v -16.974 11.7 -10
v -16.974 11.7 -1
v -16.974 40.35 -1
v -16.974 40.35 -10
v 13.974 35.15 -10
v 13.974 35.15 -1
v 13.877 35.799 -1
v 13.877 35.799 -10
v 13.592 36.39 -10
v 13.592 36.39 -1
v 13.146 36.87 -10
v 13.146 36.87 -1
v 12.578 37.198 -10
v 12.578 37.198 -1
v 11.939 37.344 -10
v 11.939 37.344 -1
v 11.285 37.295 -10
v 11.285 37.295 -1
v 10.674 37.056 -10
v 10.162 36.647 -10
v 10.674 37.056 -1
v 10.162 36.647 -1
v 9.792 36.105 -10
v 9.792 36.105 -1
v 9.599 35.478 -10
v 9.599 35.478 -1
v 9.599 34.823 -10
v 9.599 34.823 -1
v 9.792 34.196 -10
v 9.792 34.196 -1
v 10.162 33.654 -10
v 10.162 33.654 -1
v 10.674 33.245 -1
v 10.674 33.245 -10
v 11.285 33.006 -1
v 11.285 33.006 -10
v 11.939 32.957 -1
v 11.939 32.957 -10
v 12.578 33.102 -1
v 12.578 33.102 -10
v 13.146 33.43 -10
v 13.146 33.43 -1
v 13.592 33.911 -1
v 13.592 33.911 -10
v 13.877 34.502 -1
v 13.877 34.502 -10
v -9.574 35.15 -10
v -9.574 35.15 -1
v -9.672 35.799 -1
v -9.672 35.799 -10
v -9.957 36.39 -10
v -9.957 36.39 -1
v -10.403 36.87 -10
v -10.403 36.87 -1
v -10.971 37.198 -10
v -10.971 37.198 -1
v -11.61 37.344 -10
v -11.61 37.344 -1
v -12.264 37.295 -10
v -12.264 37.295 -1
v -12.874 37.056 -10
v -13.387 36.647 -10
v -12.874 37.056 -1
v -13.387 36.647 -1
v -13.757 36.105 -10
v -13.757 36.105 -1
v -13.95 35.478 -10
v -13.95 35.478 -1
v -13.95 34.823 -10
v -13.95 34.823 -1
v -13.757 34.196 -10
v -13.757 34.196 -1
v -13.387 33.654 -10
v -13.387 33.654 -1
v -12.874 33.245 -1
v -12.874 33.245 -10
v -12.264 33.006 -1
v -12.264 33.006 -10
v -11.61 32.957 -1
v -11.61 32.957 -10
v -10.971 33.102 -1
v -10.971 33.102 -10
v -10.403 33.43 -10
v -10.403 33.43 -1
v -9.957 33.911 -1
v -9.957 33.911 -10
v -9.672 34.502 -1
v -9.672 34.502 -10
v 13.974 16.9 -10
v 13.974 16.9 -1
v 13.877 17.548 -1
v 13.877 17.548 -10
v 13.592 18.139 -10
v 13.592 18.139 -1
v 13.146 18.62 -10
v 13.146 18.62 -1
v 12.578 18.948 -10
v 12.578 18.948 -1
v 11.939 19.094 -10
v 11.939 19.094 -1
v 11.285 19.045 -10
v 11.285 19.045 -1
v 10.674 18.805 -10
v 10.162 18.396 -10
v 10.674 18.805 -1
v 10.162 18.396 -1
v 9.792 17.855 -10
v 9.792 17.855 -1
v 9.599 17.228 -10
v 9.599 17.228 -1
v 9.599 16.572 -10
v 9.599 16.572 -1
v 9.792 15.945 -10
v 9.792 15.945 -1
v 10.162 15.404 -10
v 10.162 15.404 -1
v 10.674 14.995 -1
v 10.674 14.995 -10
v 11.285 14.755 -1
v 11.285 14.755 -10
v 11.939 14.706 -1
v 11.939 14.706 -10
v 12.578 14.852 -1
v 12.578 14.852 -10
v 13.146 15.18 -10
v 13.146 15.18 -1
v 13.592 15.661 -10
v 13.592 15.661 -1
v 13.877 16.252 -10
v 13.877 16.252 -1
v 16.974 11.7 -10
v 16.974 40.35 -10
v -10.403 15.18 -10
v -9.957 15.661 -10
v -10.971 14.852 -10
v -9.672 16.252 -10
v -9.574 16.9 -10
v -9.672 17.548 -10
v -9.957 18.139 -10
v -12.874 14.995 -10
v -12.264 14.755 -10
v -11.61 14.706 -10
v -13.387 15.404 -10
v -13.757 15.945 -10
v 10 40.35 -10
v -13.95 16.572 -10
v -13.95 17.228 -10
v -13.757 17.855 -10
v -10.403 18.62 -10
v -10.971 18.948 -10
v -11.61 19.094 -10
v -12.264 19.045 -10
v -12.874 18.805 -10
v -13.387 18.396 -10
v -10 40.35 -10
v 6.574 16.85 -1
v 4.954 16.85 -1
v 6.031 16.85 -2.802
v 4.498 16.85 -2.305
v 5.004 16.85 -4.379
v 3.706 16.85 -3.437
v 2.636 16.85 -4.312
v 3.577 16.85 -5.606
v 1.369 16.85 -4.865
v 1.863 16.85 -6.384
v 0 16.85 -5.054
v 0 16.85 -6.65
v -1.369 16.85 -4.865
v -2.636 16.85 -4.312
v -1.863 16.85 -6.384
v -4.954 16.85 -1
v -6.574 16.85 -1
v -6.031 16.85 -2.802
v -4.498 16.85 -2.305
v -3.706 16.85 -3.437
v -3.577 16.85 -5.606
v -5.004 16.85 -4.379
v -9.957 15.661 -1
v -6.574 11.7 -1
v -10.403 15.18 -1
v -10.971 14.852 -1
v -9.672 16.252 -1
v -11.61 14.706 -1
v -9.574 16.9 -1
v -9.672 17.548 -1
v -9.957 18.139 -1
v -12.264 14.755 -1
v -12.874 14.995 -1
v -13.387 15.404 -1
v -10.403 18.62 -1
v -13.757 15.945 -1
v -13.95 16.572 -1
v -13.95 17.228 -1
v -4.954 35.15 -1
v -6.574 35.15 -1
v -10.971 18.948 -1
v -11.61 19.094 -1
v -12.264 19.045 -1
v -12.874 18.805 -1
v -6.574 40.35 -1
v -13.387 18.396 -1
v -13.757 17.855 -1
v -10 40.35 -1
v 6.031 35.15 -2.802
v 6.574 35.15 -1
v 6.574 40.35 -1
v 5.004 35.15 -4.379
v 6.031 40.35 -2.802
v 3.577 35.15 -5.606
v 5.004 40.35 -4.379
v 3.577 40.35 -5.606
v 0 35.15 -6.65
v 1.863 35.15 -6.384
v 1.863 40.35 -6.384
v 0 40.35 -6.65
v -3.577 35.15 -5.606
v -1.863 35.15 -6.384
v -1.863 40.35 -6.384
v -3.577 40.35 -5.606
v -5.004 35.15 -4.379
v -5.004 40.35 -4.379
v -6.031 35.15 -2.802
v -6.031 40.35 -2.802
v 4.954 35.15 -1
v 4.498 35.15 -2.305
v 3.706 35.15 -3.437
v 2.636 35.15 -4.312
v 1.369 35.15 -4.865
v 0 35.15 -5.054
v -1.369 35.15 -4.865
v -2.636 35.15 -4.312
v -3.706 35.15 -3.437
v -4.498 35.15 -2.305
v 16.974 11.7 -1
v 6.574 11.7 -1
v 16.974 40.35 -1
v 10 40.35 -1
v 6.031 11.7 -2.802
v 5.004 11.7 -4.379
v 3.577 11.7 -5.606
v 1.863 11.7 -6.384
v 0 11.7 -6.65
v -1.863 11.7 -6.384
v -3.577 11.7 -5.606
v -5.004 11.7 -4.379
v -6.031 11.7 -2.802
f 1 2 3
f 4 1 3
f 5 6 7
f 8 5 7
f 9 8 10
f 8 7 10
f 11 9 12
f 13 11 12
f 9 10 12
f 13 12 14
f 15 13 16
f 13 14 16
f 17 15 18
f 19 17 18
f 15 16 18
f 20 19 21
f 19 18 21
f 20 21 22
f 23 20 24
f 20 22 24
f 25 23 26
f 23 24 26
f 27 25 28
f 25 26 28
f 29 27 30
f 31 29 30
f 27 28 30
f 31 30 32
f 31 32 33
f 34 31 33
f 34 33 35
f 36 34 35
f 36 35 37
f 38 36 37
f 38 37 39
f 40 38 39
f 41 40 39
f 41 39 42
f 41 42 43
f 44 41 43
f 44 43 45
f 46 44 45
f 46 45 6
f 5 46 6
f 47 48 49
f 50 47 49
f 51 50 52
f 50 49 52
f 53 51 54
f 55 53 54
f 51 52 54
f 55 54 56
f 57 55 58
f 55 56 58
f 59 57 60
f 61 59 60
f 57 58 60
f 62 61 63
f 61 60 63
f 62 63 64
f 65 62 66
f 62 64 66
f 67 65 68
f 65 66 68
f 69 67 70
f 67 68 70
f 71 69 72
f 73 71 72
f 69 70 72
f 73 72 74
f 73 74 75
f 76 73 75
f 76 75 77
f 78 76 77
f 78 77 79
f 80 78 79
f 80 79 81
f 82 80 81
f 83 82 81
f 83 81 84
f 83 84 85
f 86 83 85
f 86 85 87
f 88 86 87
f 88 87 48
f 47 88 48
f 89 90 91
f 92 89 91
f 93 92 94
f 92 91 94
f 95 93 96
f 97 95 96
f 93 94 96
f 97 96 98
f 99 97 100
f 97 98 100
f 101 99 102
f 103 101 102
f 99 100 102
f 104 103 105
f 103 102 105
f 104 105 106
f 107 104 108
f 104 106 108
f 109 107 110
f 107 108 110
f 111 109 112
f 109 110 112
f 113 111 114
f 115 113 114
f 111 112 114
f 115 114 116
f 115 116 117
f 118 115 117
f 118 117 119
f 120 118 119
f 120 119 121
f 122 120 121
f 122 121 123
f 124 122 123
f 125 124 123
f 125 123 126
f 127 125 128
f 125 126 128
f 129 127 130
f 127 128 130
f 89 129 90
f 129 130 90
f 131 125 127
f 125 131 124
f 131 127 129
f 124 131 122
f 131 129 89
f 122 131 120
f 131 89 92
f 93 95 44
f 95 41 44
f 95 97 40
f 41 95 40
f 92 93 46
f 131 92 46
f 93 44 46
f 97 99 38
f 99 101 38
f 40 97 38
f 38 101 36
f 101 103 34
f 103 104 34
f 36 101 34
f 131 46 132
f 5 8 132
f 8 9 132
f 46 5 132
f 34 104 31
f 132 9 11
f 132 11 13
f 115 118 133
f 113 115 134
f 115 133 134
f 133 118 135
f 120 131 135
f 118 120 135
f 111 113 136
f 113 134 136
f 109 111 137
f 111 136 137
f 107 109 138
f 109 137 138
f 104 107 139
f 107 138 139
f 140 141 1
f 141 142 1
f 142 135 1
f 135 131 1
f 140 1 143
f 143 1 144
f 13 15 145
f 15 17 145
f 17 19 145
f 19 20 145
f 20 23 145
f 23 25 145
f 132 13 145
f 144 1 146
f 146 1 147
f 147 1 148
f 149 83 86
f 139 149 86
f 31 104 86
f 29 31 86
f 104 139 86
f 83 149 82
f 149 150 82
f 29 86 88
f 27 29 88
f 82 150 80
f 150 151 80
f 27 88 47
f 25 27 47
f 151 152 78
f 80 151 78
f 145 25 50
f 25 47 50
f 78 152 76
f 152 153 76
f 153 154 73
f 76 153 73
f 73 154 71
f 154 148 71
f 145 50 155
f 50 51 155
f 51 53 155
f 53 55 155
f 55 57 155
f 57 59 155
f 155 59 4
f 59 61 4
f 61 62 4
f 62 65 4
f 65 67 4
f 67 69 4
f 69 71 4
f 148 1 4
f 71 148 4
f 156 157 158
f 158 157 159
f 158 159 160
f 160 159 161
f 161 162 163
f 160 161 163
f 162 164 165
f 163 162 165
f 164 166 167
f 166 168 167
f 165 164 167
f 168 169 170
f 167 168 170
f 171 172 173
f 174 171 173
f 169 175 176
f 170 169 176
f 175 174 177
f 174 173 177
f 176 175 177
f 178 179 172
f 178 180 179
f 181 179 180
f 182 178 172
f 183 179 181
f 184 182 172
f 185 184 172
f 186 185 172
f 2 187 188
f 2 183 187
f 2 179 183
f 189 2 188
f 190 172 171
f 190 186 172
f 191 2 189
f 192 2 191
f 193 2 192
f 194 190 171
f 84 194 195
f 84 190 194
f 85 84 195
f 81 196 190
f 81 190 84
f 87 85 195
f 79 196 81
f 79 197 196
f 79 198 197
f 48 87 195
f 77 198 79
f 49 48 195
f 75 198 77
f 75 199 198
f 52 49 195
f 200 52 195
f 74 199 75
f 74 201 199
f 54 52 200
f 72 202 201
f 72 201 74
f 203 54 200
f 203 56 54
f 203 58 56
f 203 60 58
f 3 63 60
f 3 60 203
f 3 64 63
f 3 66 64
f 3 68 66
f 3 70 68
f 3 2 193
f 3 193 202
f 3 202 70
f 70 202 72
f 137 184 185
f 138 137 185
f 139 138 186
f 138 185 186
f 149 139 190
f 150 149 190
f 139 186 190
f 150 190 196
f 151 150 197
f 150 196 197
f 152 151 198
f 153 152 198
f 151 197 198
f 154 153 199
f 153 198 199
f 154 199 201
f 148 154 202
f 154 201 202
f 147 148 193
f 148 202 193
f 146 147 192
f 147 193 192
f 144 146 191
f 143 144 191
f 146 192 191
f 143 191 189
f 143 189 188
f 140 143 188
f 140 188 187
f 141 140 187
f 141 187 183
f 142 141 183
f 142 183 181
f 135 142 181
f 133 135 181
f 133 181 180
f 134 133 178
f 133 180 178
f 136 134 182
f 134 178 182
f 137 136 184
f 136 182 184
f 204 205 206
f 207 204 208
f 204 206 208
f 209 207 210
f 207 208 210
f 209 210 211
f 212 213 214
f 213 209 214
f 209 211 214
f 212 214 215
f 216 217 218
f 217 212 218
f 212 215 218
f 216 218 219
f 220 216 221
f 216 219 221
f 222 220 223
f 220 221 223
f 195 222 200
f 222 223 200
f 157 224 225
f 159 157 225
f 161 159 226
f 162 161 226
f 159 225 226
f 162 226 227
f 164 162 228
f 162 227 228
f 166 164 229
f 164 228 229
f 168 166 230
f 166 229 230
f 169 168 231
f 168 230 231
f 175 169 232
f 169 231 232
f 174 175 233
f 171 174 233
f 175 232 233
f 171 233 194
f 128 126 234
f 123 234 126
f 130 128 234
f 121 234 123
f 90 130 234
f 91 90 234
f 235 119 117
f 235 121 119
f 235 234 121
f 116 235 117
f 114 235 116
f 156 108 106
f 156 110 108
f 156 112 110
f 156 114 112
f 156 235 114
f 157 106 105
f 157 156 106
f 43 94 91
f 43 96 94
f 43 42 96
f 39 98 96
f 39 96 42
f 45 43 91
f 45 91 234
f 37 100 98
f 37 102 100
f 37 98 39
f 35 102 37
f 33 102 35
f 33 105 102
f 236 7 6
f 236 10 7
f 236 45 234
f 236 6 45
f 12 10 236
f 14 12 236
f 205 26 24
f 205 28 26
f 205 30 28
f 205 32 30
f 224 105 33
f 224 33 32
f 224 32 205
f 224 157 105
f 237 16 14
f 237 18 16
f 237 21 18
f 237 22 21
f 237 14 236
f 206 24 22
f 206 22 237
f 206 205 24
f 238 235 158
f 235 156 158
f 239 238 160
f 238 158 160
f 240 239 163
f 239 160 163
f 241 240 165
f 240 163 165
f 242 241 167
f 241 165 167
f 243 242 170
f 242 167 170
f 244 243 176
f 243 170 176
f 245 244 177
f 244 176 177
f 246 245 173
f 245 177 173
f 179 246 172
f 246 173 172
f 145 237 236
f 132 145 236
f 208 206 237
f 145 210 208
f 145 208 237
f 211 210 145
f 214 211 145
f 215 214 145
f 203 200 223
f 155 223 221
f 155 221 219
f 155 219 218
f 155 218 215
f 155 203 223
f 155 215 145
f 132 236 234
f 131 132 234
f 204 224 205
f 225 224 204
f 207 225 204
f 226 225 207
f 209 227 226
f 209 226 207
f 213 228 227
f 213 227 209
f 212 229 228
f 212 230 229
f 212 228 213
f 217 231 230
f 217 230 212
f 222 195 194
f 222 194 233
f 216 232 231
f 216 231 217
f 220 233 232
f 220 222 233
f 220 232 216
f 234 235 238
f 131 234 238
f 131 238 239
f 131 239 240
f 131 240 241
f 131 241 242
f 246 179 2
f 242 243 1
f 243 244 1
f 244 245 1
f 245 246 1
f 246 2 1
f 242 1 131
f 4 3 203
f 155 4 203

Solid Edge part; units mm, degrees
sketch "Sketch1" plane through (0, 0, 0) normal (1, 0, 0) x (0, 1, 0)
  line L0 (11.7, -6.65) -> (16.85, -6.65)
  line L1 (16.85, -6.65) -> (16.85, -5.0543)
  line L2 (16.85, -5.0543) -> (35.15, -5.0543)
  line L3 (35.15, -5.0543) -> (35.15, -6.65)
  line L4 (35.15, -6.65) -> (40.3503, -6.65)
  line L5 (40.3503, -6.65) -> (40.3503, -10)
  line L6 (40.3503, -10) -> (11.7, -10)
  line L7 (11.7, -10) -> (11.7, -6.65)
  dimension "D1" = 0.15
  dimension "D2" = 0.15
  dimension "D3" = 10
revolve "RevolvedProtrusion1" add sketch "Sketch1" angle 360 about axis through (0, -60, 0) along (0, 1, 0)
sketch "Sketch2" plane through (0, 0, 0) normal (1, 0, 0) x (0, 1, 0)
  line L0 (11.7, -10) -> (40.3503, -10)
  line L1 (40.3503, 0) -> (40.3503, -10)
  line L2 (11.7, 0) -> (40.3503, 0)
  line L3 (11.7, 0) -> (11.7, -10)
extrude "Protrusion1" add sketch "Sketch2" along normal mid plane 20
sketch "Sketch3" plane through (0, 0, 0) normal (1, 0, 0) x (0, 1, 0)
  line L0 (11.7, 0) -> (11.7, 6.65)
  line L1 (11.7, 6.65) -> (16.85, 6.65)
  line L2 (16.85, 5.0543) -> (16.85, 6.65)
  line L3 (16.85, 5.0543) -> (35.15, 5.0543)
  line L4 (35.15, 5.0543) -> (35.15, 6.65)
  line L5 (35.15, 6.65) -> (40.3503, 6.65)
  line L6 (40.3503, 0) -> (40.3503, 6.65)
  line L7 (11.7, 0) -> (40.3503, 0)
revolve "RevolvedCutout_1" cut sketch "Sketch3" angle 284.342 about axis through (0, -60, 0) along (0, 1, 0)
sketch "Sketch4" plane through (0, 11.7, 0) normal (0, -1, 0) x (1, 0, 0)
  line L0 (-12.0207, 0) -> (12.5476, 0)
  line L1 (12.5476, 0) -> (12.5476, 10.6039)
  line L2 (12.5476, 10.6039) -> (-12.0207, 10.6039)
  line L3 (-12.0207, 10.6039) -> (-12.0207, 0)
extrude "ExtrudedCutout_1" cut sketch "Sketch4" against normal blind 426.8623
sketch "Sketch5" plane through (-10, 26.0252, -5) normal (-1, 0, 0) x (0, -1, 0)
  line L0 (-15.9005, 5) -> (15.9429, 5)
  line L1 (15.9429, 5) -> (15.9429, 4)
  line L2 (15.9429, 4) -> (-15.9005, 4)
  line L3 (-15.9005, 4) -> (-15.9005, 5)
  dimension "D1" = 1
extrude "ExtrudedCutout_2" cut sketch "Sketch5" against normal blind 53.8114
sketch "Sketch6" plane through (-7.4772, 26.0252, -1) normal (0, 0, 1) x (0, -1, 0)
  line L0 (-14.3252, -2.5228) -> (14.3252, -2.5228)
  line L1 (14.3252, -2.5228) -> (14.3252, -9.4972)
  line L2 (14.3252, -9.4972) -> (-14.3252, -9.4972)
  line L3 (-14.3252, -9.4972) -> (-14.3252, -2.5228)
  dimension "D1" = 3
  dimension "D2" = 3
  dimension "D3" = 4.4
  dimension "D4" = 6.9744
extrude "Protrusion2" add sketch "Sketch6" against normal up to vertex (9 mm away)
mirror "Mirror1" about plane through (0, 0, 0) normal (1, 0, 0) of "Protrusion2"
sketch "Sketch7" plane through (-10.9644, 26.0252, -1) normal (0, 0, 1) x (1, 0, 0)
  circle A0 centre (-0.81, -9.1252) radius 2.2
  circle A1 centre (22.7388, -9.1252) radius 2.2
  circle A2 centre (-0.81, 9.1252) radius 2.2
  circle A3 centre (22.7388, 9.1252) radius 2.2
  dimension "D1" = 3
  dimension "D2" = 3
  dimension "D3" = 3
  dimension "D4" = 3
extrude "ExtrudedCutout_3" cut sketch "Sketch7" against normal blind 291.9173
